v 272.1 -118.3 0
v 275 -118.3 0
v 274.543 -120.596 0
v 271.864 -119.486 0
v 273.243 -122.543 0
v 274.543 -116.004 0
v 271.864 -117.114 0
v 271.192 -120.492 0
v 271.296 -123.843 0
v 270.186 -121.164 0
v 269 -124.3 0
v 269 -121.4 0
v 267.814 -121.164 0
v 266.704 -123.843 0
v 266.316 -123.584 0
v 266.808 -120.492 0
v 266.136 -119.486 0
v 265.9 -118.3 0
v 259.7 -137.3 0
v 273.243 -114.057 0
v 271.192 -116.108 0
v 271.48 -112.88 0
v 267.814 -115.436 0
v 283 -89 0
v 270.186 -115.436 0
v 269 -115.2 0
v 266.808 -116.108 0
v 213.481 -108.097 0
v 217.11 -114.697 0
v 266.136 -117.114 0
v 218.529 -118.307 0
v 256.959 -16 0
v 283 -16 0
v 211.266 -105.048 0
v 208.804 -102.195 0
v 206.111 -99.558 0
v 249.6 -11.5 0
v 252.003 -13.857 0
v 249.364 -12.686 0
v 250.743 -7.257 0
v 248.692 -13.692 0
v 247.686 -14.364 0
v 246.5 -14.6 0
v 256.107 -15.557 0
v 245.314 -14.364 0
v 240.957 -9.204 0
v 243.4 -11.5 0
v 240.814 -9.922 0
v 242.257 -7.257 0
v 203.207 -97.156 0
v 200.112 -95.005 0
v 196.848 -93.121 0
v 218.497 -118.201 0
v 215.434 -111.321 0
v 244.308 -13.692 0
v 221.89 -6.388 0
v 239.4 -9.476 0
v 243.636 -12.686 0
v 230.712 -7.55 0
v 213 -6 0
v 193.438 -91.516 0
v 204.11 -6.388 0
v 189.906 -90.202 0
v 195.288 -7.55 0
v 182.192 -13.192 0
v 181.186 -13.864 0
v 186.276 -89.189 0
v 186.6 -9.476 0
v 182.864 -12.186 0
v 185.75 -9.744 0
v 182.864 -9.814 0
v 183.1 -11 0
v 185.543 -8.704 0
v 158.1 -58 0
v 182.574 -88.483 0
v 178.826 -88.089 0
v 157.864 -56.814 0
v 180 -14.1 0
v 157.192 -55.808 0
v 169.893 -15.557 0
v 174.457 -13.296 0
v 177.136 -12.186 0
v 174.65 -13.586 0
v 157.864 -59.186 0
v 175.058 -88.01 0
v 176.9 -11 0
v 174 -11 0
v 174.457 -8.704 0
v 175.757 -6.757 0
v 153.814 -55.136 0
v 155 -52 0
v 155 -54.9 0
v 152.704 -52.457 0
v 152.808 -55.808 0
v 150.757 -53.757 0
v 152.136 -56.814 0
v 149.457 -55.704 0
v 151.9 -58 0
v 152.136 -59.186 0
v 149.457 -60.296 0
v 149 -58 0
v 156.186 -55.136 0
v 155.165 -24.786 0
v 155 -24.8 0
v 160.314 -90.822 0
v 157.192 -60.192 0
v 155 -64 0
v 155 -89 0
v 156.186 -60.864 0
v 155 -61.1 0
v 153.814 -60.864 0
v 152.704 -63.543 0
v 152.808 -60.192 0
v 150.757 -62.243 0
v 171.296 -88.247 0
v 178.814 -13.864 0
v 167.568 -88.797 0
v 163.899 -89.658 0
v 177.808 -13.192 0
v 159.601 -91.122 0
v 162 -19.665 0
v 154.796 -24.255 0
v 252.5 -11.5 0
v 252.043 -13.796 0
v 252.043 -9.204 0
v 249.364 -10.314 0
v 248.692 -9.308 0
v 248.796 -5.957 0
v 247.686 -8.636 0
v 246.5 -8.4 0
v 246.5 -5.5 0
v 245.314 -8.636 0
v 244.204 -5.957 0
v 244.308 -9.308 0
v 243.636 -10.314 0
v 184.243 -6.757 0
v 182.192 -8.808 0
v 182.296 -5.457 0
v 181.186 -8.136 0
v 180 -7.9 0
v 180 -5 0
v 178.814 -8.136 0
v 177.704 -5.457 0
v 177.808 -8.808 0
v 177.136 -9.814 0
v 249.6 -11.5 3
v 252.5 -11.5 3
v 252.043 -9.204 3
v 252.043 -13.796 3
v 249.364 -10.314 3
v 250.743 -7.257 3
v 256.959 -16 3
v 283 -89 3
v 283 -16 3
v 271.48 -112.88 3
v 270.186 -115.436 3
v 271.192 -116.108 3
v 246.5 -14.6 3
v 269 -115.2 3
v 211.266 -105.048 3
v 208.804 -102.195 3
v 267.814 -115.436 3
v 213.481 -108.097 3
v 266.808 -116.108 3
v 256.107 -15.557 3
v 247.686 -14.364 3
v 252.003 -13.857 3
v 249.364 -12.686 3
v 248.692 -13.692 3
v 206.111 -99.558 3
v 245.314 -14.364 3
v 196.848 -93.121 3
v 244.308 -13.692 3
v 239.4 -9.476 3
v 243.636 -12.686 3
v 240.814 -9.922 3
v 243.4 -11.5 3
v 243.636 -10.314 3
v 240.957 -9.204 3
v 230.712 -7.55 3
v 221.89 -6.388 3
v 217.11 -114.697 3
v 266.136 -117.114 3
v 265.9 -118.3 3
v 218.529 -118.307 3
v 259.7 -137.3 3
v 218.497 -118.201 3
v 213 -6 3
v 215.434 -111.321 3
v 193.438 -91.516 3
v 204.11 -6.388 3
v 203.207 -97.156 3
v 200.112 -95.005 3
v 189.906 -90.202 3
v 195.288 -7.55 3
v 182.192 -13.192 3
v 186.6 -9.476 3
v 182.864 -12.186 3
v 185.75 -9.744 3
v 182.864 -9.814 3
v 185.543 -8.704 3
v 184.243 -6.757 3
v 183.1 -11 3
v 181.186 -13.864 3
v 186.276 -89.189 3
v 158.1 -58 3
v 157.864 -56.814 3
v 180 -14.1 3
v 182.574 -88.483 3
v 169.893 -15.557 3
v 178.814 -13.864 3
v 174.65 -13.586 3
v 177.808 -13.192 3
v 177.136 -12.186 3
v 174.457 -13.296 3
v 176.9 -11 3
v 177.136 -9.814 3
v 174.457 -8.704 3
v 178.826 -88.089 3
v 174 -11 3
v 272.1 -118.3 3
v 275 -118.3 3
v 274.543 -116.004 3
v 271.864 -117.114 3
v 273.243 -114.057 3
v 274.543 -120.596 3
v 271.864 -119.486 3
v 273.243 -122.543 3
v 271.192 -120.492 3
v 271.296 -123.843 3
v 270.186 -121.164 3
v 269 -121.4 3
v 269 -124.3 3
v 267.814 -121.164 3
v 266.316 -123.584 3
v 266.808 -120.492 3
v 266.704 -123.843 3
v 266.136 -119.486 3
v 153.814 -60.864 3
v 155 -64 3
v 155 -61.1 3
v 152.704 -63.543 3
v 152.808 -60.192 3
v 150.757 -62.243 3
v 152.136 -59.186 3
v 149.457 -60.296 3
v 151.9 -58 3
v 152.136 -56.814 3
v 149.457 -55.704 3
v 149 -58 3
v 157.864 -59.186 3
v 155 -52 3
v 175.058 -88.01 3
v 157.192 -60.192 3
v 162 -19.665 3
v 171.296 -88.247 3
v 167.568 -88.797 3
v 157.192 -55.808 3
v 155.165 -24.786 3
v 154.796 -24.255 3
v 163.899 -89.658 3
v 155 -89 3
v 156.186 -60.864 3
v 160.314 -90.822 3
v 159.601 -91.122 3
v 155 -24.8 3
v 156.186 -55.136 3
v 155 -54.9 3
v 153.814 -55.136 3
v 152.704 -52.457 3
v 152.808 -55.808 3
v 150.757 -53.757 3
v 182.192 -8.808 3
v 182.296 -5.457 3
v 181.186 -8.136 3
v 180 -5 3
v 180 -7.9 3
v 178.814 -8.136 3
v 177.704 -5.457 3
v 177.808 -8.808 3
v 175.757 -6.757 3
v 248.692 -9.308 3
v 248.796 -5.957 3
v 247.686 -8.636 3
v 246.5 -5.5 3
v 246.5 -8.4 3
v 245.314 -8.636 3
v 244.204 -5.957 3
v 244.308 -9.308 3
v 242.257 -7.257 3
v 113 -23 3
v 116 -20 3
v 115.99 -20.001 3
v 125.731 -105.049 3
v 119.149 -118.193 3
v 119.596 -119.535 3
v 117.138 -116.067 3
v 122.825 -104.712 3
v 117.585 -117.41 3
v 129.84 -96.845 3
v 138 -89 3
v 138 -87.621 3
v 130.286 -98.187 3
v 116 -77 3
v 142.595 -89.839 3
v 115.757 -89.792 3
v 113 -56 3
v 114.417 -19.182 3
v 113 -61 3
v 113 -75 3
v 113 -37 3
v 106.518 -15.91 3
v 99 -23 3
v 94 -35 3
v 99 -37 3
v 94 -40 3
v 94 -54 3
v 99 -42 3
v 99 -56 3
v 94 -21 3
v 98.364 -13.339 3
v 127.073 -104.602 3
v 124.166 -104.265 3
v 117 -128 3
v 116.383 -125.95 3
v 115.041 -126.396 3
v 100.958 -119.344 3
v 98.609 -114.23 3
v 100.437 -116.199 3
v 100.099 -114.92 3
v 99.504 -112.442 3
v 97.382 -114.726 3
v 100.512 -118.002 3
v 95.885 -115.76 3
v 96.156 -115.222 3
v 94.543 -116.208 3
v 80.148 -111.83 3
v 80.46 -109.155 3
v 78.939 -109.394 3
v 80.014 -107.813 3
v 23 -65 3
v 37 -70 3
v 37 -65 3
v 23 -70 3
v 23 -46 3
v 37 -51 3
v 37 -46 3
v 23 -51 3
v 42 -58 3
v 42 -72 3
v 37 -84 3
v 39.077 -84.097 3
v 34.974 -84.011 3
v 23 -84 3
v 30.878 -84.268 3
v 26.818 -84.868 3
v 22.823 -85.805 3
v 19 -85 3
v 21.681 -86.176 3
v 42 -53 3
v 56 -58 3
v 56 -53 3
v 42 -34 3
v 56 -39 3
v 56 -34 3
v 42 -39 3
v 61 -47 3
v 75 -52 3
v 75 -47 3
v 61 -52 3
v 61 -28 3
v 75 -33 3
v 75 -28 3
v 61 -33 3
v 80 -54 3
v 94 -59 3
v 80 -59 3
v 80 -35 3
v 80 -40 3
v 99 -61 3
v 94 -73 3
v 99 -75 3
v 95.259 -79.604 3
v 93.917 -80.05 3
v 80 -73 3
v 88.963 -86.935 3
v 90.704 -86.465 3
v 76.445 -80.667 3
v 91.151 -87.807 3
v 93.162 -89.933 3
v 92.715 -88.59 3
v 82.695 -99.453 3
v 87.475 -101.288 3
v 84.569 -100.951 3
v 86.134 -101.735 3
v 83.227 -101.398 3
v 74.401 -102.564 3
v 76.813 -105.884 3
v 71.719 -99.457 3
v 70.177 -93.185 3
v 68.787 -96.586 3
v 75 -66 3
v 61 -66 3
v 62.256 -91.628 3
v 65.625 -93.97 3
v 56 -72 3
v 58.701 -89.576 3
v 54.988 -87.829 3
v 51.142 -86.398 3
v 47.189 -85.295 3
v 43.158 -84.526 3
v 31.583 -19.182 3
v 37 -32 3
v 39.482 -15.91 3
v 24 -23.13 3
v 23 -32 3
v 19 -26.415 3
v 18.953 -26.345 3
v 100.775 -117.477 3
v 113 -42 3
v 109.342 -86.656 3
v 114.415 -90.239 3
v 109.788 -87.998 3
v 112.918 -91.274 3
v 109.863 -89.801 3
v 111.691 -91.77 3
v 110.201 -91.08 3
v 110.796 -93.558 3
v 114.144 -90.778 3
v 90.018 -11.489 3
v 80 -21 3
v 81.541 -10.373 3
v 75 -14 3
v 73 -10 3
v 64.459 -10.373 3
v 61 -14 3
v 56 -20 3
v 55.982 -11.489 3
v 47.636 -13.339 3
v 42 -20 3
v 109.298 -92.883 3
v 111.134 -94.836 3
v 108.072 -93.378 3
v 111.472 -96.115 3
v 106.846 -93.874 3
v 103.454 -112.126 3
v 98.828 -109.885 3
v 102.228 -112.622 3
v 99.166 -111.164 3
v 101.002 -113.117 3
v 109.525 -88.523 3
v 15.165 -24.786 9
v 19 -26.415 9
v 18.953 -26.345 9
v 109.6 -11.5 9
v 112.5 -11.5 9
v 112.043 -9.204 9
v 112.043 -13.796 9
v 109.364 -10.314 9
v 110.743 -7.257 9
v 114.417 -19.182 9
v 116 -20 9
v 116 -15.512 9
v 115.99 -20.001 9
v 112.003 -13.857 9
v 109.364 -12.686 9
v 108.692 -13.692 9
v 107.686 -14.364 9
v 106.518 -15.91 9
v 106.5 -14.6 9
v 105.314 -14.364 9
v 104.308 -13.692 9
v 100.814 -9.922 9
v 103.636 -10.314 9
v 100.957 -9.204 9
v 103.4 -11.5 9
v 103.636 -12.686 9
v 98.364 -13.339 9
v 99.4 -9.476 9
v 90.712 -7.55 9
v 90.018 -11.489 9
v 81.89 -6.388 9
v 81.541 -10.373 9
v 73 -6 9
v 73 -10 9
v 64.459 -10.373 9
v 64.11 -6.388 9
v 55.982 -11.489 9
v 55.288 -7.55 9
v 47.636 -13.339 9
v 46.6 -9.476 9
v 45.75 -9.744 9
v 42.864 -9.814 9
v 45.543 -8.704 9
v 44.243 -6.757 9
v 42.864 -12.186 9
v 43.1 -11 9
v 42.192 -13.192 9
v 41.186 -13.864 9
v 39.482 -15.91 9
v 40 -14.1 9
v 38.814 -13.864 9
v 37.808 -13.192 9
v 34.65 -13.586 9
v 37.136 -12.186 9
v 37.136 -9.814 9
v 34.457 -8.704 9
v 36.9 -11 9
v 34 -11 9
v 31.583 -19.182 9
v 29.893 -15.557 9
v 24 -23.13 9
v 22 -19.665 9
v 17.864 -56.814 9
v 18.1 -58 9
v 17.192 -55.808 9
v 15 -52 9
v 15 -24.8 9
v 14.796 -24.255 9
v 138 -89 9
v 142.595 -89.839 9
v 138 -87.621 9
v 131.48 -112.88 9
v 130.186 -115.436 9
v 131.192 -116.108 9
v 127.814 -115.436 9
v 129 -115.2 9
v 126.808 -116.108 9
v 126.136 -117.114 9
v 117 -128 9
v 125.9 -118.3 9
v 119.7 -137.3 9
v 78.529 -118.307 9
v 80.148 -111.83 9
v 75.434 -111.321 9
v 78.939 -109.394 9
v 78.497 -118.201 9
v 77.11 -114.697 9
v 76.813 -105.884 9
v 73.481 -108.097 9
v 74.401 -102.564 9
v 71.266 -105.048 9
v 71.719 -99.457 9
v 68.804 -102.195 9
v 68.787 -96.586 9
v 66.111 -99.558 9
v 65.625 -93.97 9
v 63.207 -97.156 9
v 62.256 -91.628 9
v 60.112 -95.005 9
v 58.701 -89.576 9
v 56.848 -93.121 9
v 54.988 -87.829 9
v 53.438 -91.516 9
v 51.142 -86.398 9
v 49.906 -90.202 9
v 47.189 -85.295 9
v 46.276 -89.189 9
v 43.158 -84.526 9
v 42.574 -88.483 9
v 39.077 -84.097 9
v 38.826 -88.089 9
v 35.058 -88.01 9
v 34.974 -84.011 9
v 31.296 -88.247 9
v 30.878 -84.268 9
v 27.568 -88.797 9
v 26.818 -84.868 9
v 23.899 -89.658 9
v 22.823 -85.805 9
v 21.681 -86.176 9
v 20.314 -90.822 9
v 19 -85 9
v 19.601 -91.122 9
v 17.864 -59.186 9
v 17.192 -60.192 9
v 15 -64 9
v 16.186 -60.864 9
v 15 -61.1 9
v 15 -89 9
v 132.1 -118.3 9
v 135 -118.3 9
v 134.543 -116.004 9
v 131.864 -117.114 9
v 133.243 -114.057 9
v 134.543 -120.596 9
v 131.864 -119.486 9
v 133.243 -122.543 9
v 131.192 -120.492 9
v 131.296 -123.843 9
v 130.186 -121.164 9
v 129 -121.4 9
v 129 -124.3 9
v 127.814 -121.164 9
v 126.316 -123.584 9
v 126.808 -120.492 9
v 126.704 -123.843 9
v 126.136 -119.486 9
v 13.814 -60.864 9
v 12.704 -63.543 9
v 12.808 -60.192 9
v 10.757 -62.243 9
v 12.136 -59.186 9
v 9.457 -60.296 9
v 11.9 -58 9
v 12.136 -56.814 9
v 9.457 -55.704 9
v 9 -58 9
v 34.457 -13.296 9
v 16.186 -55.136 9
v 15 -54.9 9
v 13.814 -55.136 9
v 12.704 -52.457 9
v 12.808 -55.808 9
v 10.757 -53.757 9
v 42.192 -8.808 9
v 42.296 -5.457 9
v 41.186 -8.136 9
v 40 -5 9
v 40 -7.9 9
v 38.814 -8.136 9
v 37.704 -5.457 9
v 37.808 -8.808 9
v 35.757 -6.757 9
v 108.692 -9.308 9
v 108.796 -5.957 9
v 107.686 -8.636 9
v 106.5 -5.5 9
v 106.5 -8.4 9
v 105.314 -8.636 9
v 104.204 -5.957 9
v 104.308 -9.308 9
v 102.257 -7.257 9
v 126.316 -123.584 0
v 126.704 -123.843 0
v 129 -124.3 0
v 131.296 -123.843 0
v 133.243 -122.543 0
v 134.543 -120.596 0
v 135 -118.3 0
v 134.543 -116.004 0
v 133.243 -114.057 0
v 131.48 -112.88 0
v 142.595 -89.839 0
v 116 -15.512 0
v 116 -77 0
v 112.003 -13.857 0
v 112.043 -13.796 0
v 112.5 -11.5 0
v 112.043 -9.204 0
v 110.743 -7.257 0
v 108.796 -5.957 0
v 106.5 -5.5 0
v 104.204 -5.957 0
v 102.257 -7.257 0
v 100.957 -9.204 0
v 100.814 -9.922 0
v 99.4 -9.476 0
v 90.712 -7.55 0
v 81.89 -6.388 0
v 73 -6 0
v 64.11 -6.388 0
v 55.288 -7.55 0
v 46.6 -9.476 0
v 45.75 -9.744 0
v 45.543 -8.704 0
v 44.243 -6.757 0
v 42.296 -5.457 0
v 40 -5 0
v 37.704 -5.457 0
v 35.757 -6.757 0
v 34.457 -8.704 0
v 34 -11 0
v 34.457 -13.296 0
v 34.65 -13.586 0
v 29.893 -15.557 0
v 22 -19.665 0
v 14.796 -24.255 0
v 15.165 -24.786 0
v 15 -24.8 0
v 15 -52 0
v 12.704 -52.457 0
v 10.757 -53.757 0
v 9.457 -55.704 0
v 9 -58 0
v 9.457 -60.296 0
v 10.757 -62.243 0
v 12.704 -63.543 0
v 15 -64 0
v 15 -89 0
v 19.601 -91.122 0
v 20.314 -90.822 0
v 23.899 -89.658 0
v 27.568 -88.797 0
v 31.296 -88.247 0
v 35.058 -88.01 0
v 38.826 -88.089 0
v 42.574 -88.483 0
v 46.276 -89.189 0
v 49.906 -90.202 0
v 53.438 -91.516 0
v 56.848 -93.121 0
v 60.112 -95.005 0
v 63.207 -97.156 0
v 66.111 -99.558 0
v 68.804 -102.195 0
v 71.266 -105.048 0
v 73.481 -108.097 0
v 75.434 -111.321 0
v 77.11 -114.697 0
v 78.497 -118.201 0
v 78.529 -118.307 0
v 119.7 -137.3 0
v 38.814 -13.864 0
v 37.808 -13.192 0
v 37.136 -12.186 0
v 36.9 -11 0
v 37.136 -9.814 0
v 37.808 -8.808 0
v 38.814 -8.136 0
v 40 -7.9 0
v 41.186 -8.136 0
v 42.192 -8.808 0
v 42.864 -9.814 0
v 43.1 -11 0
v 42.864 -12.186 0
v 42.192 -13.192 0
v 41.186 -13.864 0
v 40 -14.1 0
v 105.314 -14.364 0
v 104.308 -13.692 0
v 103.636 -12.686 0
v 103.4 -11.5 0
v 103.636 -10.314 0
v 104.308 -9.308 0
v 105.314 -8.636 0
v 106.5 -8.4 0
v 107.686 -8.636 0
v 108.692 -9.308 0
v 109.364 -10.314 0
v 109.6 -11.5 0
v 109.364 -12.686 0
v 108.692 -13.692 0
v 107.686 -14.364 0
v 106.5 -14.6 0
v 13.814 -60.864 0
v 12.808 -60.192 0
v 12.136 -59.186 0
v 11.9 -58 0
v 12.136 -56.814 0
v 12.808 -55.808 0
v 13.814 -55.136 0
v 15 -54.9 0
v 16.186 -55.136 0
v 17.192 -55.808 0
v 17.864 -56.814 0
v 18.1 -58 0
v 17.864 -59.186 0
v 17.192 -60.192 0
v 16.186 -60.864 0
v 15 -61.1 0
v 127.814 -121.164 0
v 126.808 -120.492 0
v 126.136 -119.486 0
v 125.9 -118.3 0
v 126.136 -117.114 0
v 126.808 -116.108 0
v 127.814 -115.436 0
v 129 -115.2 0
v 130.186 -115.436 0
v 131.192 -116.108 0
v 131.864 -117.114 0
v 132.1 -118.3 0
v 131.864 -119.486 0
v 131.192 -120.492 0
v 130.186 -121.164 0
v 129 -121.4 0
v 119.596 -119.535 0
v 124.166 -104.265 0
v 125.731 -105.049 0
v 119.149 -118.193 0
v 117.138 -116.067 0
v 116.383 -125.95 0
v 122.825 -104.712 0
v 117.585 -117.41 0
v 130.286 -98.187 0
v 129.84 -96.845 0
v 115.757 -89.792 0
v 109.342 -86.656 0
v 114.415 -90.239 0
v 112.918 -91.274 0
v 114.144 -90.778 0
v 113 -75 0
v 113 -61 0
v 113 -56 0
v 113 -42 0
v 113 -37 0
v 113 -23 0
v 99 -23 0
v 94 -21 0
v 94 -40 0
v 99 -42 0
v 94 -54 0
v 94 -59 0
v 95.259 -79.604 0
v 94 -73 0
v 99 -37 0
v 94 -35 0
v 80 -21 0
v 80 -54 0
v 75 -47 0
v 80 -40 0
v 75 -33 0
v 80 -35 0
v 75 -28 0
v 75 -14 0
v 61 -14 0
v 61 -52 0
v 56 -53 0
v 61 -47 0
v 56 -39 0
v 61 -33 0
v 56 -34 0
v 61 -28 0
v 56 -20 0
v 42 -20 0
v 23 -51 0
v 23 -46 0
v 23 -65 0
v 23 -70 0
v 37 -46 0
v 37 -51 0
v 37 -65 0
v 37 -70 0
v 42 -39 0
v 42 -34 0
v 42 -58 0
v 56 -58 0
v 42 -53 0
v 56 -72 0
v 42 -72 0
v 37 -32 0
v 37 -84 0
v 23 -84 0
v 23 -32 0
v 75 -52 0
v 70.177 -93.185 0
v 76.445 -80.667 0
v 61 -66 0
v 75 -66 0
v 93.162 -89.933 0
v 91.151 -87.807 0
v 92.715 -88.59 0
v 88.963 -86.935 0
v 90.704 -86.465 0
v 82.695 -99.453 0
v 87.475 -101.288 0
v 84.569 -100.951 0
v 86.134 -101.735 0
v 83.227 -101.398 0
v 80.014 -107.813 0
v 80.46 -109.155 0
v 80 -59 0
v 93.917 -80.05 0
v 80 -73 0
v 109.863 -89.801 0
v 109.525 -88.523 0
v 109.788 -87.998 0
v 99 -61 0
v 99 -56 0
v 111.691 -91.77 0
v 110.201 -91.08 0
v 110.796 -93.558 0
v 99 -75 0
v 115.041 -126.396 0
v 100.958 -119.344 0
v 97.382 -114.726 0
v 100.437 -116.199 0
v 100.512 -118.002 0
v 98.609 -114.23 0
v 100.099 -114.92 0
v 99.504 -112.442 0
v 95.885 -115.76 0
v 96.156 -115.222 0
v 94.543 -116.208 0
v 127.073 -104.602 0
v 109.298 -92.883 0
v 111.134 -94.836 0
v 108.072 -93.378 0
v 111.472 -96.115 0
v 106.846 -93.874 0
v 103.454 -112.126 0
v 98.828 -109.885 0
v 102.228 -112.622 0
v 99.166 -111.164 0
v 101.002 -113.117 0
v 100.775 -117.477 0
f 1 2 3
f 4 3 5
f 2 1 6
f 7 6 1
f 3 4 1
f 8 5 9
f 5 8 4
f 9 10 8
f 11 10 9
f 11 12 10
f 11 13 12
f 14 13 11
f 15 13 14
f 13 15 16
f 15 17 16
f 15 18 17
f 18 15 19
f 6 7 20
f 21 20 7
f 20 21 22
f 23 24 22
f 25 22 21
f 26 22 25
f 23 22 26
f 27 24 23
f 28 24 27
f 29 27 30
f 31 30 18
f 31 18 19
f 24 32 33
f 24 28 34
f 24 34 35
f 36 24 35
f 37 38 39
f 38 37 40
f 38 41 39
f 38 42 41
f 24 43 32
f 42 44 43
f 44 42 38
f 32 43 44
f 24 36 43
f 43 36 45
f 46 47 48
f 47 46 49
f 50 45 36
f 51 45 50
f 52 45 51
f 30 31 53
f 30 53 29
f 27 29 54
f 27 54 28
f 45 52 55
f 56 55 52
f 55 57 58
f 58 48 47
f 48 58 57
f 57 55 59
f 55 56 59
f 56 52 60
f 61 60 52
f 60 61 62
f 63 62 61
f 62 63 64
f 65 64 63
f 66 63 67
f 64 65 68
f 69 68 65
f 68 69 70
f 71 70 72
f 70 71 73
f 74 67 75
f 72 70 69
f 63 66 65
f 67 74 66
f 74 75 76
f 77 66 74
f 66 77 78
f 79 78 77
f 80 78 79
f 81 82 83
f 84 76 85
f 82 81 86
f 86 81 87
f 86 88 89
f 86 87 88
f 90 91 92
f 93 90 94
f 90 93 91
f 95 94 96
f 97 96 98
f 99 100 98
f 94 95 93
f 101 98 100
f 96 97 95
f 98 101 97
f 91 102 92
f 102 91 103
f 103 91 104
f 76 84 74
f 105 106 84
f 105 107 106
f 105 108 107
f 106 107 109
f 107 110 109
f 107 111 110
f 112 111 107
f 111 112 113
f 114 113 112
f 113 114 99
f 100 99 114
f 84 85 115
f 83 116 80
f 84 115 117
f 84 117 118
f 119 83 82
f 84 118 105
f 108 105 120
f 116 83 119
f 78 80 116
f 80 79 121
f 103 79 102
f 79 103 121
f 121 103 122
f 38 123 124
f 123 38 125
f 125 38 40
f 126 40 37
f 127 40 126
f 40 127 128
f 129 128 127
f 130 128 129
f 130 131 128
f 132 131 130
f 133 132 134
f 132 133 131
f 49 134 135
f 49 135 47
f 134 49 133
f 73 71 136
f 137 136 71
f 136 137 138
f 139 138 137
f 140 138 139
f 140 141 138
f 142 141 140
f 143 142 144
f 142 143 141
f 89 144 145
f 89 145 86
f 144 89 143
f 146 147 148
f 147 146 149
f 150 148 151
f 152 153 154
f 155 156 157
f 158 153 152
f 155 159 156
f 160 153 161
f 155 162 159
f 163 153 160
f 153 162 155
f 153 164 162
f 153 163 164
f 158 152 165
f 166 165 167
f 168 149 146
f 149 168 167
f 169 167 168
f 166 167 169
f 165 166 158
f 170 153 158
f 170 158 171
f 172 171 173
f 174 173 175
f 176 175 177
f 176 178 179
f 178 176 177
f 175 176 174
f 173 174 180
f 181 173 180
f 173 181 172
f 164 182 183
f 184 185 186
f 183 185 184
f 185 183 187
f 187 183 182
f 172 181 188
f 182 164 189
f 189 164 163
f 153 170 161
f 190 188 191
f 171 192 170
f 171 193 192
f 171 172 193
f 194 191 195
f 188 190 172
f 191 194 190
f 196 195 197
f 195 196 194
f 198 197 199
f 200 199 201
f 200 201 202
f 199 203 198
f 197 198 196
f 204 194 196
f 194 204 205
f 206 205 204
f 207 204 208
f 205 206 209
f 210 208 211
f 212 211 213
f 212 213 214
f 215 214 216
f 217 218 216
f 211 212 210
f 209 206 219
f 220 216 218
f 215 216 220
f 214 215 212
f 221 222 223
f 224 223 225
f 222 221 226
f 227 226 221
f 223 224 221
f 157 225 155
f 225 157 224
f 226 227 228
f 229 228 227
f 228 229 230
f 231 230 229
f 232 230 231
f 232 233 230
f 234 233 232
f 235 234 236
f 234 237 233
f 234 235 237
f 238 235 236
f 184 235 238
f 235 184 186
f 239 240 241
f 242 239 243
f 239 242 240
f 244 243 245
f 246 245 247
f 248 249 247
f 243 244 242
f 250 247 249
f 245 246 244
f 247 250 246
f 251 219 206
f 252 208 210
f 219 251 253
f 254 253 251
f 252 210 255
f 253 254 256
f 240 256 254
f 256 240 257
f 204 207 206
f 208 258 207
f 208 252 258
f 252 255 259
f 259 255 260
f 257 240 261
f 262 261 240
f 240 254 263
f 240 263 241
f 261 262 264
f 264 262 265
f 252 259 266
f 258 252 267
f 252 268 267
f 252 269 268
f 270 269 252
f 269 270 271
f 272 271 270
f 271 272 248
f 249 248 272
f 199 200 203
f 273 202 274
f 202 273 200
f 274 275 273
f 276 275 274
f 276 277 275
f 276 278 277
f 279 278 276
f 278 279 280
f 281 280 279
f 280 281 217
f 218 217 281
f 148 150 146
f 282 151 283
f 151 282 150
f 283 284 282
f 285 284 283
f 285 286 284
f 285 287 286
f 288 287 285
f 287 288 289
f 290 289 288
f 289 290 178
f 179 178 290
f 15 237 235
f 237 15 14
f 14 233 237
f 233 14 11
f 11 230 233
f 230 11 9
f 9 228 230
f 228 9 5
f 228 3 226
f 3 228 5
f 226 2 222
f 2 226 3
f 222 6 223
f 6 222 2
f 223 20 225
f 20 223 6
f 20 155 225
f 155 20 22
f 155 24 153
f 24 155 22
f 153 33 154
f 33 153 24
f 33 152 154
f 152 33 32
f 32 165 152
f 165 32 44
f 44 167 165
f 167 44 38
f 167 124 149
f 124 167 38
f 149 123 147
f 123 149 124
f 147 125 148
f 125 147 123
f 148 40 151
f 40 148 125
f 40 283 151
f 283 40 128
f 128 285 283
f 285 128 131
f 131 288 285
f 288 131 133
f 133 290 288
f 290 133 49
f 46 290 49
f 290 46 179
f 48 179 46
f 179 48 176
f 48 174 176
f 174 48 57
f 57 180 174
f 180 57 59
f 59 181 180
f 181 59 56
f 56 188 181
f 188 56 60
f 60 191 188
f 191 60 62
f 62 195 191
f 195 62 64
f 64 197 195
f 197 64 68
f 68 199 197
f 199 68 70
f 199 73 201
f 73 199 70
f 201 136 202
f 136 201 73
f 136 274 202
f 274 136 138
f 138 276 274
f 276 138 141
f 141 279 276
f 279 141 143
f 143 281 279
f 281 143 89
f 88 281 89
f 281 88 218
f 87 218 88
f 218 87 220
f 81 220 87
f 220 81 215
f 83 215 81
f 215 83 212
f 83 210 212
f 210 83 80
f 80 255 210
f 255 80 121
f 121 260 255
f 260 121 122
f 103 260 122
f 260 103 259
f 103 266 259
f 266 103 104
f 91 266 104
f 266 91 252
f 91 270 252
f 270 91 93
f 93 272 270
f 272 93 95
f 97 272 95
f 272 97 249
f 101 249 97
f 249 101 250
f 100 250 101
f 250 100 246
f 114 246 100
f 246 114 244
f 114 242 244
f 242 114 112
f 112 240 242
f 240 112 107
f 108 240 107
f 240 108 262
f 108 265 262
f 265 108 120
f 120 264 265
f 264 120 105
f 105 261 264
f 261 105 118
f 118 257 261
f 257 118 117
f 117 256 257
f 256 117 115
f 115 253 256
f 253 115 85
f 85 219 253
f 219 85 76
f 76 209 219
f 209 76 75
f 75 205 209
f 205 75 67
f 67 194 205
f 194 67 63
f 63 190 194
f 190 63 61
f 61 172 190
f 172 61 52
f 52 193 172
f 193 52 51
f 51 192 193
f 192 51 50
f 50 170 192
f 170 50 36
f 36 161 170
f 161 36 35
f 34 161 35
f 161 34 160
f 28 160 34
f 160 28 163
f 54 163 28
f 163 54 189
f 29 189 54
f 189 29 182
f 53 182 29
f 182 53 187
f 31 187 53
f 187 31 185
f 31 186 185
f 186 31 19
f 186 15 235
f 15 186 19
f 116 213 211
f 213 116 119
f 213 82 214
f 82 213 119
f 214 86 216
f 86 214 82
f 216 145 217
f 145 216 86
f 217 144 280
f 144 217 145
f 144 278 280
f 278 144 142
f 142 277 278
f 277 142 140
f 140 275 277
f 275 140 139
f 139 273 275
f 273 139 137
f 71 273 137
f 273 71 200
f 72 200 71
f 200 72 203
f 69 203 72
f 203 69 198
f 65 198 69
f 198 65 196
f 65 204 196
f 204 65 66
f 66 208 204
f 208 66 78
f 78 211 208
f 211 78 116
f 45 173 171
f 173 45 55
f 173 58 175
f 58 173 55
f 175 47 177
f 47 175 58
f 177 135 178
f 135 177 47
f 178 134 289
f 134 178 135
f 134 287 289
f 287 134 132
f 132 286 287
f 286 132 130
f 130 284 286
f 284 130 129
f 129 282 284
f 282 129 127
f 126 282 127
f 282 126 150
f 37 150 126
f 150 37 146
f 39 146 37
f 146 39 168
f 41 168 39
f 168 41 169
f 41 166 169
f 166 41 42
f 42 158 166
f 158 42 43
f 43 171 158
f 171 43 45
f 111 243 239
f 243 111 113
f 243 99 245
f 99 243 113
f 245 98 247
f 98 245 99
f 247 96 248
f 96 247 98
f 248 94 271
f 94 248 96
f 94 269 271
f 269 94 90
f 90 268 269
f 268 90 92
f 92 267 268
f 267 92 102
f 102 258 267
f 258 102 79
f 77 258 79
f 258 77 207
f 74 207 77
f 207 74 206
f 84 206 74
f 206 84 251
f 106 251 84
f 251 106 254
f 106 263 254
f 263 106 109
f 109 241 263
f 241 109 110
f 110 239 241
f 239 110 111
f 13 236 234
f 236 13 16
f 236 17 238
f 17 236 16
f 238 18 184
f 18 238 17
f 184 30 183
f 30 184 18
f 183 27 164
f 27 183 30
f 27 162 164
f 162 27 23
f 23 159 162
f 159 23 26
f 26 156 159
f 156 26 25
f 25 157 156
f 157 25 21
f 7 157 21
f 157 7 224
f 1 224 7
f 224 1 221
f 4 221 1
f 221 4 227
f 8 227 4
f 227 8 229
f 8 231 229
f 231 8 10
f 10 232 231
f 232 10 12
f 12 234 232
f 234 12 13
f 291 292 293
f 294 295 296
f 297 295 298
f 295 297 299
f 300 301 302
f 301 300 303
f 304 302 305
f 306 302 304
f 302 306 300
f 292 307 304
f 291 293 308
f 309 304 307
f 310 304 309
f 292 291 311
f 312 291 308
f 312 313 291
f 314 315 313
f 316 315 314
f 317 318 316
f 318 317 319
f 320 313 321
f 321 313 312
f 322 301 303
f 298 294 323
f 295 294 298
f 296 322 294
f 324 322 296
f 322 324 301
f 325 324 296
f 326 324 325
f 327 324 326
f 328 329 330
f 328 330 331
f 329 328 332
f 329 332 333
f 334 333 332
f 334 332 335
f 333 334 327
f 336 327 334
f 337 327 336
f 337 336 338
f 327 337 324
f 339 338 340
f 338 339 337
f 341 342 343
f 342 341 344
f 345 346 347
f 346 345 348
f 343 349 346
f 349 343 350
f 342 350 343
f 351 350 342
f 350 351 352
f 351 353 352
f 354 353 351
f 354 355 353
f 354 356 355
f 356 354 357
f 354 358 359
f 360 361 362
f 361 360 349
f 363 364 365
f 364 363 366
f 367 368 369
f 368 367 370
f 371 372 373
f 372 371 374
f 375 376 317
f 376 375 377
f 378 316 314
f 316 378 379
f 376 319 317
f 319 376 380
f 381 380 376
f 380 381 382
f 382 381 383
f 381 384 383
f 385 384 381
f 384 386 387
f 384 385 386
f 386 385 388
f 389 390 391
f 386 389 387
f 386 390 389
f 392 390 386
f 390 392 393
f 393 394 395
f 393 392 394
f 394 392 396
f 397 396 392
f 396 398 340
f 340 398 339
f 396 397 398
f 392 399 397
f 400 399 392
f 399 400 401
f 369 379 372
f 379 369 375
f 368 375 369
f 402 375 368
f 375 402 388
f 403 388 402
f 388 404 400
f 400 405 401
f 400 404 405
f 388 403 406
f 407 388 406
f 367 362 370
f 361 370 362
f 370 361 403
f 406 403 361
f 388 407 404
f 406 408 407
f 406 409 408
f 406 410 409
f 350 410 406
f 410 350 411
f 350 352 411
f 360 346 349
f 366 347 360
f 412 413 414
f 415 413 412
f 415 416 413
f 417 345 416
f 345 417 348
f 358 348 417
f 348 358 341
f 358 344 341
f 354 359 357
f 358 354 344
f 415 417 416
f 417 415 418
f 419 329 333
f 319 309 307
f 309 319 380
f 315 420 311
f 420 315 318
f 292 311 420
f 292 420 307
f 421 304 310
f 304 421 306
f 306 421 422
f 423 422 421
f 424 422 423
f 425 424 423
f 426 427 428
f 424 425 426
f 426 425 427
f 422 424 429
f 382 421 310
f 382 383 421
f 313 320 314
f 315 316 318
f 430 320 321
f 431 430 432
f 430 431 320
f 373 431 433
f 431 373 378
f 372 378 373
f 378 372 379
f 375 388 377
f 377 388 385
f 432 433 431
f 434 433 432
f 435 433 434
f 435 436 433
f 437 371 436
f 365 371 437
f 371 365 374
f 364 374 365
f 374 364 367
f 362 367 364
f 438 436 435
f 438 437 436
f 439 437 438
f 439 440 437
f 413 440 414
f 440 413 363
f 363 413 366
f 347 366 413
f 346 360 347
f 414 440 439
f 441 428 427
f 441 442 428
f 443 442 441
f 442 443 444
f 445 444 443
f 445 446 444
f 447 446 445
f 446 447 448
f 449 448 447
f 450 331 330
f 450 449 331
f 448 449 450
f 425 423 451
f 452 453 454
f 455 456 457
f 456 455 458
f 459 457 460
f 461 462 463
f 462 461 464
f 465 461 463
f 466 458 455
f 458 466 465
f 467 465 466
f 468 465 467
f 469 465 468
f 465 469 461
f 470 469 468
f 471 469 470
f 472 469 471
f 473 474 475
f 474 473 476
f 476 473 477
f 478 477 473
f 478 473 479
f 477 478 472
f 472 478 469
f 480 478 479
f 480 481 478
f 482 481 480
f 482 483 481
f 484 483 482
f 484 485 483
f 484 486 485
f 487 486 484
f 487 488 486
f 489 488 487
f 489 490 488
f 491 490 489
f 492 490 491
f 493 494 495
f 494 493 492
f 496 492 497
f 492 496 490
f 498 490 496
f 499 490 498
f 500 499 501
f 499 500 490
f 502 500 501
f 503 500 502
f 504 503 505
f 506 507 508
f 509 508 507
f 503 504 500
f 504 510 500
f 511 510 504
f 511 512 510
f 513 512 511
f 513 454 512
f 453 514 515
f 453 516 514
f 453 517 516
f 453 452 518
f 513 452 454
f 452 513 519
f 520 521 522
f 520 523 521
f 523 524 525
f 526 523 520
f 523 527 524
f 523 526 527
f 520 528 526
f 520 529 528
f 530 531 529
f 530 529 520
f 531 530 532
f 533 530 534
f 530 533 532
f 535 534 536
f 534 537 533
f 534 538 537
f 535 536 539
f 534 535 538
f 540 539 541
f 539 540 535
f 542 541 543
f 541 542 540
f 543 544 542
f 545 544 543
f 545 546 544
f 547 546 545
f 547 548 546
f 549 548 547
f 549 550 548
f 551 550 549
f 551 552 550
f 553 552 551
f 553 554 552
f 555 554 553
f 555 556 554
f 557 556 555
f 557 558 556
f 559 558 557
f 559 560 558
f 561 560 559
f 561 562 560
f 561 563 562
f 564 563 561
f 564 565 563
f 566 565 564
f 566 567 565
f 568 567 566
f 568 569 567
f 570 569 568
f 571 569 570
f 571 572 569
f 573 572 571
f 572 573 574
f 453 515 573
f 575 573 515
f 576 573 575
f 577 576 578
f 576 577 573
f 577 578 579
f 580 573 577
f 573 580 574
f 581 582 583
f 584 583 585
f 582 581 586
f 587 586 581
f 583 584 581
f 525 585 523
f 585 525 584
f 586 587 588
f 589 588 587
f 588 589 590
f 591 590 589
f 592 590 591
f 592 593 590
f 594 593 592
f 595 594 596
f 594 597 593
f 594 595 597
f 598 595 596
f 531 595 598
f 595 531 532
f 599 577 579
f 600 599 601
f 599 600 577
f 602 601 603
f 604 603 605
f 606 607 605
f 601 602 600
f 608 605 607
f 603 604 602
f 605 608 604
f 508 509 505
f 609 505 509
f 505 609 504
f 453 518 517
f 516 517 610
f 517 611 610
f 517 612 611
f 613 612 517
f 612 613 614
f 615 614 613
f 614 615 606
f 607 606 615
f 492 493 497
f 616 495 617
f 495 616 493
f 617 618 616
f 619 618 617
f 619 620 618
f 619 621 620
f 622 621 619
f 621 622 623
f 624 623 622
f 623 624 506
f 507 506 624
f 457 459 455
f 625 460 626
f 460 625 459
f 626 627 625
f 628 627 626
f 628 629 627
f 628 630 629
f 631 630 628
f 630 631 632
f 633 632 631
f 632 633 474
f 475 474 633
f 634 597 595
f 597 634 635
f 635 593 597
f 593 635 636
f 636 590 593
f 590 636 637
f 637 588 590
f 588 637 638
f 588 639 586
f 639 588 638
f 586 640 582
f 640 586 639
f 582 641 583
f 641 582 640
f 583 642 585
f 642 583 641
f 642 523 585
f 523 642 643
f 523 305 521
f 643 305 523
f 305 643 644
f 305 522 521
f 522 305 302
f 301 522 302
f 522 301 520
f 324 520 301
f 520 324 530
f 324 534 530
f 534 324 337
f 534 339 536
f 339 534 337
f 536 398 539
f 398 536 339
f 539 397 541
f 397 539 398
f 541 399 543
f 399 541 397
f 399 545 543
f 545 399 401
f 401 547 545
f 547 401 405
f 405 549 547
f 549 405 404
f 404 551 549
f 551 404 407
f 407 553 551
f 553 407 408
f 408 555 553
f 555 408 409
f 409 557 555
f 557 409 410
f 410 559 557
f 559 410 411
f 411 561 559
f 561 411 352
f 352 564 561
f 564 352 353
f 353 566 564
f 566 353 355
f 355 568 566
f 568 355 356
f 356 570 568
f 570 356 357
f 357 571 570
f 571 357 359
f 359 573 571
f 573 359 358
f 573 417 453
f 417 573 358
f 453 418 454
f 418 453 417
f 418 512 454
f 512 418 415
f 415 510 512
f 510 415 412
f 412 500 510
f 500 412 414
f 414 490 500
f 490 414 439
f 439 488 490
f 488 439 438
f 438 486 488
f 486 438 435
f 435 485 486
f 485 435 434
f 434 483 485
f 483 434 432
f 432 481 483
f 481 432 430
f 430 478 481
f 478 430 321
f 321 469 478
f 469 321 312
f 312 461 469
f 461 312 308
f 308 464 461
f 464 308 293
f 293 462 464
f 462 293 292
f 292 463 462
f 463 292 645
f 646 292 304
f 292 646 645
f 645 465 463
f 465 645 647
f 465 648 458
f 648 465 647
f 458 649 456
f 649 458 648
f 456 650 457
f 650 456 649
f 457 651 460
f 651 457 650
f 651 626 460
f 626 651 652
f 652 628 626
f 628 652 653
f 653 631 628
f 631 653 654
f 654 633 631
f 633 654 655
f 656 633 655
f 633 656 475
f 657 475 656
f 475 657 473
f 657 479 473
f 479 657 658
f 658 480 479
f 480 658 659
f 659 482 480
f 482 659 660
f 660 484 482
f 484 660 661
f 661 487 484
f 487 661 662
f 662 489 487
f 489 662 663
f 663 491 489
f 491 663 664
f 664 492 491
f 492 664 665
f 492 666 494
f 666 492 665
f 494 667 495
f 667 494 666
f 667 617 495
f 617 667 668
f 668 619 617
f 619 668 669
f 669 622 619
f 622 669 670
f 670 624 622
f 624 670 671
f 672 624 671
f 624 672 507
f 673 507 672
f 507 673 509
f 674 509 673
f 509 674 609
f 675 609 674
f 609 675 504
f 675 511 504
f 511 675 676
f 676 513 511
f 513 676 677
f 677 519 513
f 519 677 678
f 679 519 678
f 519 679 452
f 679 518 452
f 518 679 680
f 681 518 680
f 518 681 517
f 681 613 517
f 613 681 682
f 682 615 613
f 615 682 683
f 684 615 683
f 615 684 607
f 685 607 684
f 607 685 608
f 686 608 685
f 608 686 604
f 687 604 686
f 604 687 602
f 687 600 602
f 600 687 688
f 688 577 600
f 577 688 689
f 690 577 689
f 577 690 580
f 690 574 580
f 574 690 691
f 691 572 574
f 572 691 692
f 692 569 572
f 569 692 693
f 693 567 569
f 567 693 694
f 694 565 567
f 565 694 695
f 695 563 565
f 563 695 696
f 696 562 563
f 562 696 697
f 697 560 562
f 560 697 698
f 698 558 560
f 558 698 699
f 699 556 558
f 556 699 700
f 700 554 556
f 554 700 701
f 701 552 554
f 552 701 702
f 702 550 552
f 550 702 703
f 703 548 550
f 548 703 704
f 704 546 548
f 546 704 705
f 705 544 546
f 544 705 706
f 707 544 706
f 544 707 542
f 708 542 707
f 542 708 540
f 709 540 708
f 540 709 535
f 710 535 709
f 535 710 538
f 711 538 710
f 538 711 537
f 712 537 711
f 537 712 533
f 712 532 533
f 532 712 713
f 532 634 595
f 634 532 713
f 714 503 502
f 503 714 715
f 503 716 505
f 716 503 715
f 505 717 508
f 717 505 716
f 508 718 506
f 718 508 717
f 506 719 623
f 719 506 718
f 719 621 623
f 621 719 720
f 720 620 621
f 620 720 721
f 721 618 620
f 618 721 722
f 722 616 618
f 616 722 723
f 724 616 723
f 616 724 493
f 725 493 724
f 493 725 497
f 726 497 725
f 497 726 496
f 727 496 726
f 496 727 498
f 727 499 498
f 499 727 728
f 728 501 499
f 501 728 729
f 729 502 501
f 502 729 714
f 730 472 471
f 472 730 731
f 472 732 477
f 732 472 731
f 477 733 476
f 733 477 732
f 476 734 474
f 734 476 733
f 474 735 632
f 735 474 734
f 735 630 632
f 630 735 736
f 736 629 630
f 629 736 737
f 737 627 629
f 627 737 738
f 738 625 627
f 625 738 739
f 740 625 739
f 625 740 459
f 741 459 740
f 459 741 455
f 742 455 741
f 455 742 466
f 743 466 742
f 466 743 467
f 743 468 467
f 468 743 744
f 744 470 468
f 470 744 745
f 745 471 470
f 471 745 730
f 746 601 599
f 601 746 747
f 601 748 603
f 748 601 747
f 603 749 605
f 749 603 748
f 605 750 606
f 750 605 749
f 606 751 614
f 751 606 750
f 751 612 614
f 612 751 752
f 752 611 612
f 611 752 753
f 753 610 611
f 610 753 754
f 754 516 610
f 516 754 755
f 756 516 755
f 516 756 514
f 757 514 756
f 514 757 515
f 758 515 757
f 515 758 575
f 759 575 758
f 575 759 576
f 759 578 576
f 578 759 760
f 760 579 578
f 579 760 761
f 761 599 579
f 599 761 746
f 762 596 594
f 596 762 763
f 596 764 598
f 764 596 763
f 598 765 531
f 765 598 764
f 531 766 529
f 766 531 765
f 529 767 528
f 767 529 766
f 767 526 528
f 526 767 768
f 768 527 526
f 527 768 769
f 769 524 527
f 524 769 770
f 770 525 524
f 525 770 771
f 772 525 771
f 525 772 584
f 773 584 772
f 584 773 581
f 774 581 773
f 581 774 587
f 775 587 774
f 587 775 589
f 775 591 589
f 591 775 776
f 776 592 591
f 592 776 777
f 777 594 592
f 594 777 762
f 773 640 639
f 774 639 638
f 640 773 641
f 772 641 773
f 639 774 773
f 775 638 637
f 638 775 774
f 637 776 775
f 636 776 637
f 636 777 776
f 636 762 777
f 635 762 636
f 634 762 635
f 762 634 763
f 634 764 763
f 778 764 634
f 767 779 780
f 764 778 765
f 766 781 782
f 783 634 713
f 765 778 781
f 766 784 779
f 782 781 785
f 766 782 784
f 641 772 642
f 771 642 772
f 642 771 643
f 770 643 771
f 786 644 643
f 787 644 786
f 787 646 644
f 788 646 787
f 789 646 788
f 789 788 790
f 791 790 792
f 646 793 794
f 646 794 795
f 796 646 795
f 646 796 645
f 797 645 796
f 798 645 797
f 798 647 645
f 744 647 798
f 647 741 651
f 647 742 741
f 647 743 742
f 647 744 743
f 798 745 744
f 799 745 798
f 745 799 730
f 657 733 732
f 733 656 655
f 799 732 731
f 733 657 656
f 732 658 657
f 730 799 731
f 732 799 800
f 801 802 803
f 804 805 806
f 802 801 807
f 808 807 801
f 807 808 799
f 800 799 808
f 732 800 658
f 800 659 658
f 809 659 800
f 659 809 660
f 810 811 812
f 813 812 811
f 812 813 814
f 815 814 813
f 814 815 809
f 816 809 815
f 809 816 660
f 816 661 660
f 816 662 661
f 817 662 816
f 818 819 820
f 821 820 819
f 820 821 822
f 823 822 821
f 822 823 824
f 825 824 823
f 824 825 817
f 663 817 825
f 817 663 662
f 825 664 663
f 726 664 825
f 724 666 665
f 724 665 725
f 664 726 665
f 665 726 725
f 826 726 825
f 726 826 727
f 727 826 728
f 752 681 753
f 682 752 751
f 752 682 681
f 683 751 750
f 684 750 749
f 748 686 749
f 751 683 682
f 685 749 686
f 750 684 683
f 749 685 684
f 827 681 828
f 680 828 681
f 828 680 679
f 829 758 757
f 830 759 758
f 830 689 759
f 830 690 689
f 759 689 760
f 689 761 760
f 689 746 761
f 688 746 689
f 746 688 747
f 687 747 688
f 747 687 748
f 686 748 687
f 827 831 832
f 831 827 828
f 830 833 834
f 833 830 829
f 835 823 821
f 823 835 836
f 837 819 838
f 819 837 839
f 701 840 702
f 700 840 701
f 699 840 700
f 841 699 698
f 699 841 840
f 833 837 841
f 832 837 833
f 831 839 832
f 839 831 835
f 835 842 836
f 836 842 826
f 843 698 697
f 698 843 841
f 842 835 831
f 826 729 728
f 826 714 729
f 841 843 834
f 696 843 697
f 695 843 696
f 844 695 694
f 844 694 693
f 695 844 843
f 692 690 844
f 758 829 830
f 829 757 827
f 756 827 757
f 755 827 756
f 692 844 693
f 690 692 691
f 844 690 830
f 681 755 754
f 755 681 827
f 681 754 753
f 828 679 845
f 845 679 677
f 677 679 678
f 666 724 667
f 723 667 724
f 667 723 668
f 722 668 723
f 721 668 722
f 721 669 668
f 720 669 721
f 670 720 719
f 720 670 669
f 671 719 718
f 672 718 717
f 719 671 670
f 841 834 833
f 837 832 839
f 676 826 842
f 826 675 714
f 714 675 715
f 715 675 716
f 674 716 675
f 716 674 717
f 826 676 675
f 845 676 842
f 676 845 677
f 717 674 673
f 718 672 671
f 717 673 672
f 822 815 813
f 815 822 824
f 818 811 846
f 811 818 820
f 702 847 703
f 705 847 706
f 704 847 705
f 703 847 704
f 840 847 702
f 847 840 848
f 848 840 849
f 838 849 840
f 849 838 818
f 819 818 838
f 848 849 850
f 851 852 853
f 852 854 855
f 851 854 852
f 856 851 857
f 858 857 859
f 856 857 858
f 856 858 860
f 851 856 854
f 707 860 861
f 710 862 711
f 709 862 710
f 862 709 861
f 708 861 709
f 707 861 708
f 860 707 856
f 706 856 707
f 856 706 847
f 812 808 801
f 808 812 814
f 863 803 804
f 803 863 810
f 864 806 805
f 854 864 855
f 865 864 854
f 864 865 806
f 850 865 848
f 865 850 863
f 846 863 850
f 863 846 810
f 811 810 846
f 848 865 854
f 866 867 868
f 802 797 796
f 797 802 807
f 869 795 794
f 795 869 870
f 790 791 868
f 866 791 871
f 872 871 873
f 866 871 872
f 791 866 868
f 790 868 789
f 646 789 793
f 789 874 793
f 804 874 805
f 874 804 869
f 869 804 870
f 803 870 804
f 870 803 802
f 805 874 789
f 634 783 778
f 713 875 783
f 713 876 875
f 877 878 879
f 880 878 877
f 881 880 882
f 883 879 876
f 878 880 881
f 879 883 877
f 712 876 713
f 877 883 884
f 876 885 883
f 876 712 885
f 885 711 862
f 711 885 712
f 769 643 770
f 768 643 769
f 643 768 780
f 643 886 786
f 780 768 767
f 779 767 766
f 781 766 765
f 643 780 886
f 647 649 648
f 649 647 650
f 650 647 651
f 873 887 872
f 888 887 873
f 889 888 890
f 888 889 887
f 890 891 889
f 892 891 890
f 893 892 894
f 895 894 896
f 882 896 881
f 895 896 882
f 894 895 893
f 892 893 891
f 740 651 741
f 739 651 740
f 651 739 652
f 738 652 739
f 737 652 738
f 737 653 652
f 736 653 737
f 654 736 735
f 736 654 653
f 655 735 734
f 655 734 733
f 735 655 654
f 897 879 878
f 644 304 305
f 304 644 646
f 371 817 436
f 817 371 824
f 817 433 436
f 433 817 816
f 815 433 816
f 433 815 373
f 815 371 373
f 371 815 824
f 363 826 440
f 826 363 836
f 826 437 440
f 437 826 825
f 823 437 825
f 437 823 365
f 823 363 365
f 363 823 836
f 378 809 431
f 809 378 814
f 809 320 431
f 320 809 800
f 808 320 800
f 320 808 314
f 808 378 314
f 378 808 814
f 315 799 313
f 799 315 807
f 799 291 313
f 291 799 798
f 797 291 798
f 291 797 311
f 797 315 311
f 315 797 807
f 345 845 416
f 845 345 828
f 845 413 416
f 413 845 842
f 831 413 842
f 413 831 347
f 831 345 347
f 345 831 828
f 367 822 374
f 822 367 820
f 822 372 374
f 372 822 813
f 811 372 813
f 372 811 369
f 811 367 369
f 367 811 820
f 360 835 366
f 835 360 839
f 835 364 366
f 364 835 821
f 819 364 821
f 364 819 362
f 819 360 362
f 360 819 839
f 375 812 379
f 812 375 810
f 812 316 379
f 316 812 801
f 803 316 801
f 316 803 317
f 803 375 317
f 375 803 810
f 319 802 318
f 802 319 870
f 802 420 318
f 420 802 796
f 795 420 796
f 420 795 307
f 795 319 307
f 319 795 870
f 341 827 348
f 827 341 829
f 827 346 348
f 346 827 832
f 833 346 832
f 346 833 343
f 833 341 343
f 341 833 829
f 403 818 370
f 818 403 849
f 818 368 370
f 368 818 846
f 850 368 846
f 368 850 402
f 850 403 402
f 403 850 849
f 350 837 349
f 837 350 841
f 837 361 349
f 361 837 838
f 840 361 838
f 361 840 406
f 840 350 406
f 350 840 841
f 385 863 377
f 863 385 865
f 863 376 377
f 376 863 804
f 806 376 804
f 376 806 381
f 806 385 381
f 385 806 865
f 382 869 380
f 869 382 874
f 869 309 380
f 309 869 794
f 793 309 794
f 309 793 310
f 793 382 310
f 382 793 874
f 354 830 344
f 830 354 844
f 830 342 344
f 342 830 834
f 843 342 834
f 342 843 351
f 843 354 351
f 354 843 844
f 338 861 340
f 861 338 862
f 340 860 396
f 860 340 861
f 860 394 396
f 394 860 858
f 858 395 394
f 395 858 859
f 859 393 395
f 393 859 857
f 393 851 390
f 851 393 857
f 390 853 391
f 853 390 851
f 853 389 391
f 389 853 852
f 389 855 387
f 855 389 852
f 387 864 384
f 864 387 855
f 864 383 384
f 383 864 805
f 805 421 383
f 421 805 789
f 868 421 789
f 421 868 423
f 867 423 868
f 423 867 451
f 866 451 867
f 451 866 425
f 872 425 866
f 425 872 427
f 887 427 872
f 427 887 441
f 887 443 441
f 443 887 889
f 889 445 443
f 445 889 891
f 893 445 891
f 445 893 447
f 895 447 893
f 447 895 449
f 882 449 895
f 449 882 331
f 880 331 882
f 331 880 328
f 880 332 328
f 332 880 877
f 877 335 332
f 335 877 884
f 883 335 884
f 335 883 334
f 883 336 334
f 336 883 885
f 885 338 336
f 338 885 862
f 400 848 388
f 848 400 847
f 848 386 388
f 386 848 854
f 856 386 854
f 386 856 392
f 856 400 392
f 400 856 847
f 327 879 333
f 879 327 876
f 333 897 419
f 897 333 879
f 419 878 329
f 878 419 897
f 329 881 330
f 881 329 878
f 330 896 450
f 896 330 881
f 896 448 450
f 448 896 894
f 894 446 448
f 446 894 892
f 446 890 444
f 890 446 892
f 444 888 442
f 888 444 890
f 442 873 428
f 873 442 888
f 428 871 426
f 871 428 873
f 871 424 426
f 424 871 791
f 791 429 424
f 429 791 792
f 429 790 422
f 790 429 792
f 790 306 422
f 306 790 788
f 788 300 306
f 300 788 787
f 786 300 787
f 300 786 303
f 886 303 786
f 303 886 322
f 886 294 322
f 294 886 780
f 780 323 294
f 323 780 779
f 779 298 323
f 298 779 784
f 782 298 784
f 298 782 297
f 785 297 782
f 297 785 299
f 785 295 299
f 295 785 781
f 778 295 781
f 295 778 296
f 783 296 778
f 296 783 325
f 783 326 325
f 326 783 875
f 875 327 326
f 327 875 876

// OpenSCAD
$fn = 16;

bottom_thickness = 3;
middle_thickness = 5;
switch_thickness = 5;

is_36 = true;

module sector(radius, angles, fn = 24) {
    r = radius / cos(180 / fn);
    step = -360 / fn;

    points = concat([[0, 0]],
        [for(a = [angles[0] : step : angles[1] - 360]) 
            [r * cos(a), r * sin(a)]
        ],
        [[r * cos(angles[1]), r * sin(angles[1])]]
    );

    difference() {
        circle(radius, $fn = fn);
        polygon(points);
    }
}

module arc(radius, angles, width = 1, fn = 24) {
    difference() {
        sector(radius + width, angles, fn);
        sector(radius, angles, fn);
    }
}

module single_screw_hole() {
    circle(r=1.2);
}

module screw_holes() {
    union() {
        translate([17.5,  -26,    0]) single_screw_hole();
        translate([18.5,  -88,    0]) single_screw_hole();
        translate([81.0,  -116,   0]) single_screw_hole();
        translate([118.5, -132.5, 0]) single_screw_hole();
        translate([139,   -88.5,  0]) single_screw_hole();
        translate([140,   -56.5,  0]) single_screw_hole();
        translate([140,   -20.5,  0]) single_screw_hole();
        translate([112.5, -17.2,  0]) single_screw_hole();
        translate([71,    -8.6,   0]) single_screw_hole();
    }
}

tenting_positions = [[129, -118.3], [40, -11], [106.5, -11.5], [15, -58]];
module tenting_wing() {
    circle(r=6);
}

module tenting_hole() {
    circle(r=3.1);
}

module alpha_holes() {
    for (j=[0:2]) {
        translate([0, (j * 19), 0]) {
            for (i=[0:4]) {
                translate([(i * 19), 0, 0]) {
                    square(size=[14, 14], center=true);
                }
            }
        }
    }
}

module lone_hole() {
    translate([79.57, -90.06]) {
        rotate([0, 0, 63.4]) {
            square(size=[14, 14], center=true);
        }
    }
}

module thumb_hole() {
    polygon(
        points=[
            [7,       7],
            [7,       5],
            [8.5,     5],
            [8.5,     8],
            [15.5,    8],
            [15.5,    2.3],
            [16.25,   2.3],
            [16.25,  -1],
            [15.5,   -1],
            [15.5,   -7],
            [14.5,   -7],
            [14.5,   -8],
            [9,      -8],
            [9,      -7],
            [8.5,    -7],
            [8.5,    -6],
            [7,      -6],
            [7,      -7],
            [-7,     -7],
            [-7,     -6],
            [-8.5,   -6],
            [-8.5,   -7],
            [-9,     -7],
            [-9,     -8],
            [-14.5,  -8],
            [-14.5,  -7],
            [-15.5,  -7],
            [-15.5,  -1],
            [-16.25, -1],
            [-16.25,  2.3],
            [-15.5,   2.3],
            [-15.5,   8],
            [-8.5,    8],
            [-8.5,    5],
            [-7,      5],
            [-7,      7],
        ]
    );
    
}

module plain_thumb_hole() {
    polygon(
        points=[
            [-17,   11],
            [-7,    11],
            [-7,     7],
            [7,      7],
            [7,     11],
            [17,    11],
            [17,   -8.7],
            [8.5,  -8.7],
            [8.5,  -7],
            [-8.5, -7],
            [-8.5, -8.7],
            [-17,  -8.7],
        ]
    );
    
}

stagger = [-39, -27, -21, -28, -30];

module alpha_holes() {
    for (i=[0:2]) {
        for (j=[0:4]) {
            translate([(30 + j * 19), (stagger[j] - i * 19)])
            square(size=[14, 14], center=true);
        }
    }
}

module inner_room() {
    angles = [63.7, 123.5];
    anglea = [15, 112];
    difference() {
        union() {
            translate([73, -108]) sector(98, angles, 72);
            polygon(
                points=[
                    [19,   -26.4],
                    [19,   -85],
                    [117,  -128],
                    [138,  -89],
                    [138,  -20],
                    [116,  -20],
                ]
            );
        }
        translate([36, -133]) sector(49, anglea, 75);
    }
}

module bottom_plate() {
    angles = [63.7, 124.8];
    anglea = [15, 112];
    difference() {
        union() {
            translate([73, -108]) sector(102, angles, 72);
            polygon(
                points=[
                    [15,    -24.8],
                    [15,    -89],
                    [119.7, -137.3],
                    [143,   -89],
                    [143,   -16],
                    [116,   -16],
                ]
            );
            for (i=[0:3]) {
                translate(tenting_positions[i]) tenting_wing();
            }
        }
        translate([36, -133]) sector(45, anglea, 75);
        //screw_holes();
        for (i=[0:3]) {
            translate(tenting_positions[i]) tenting_hole();
        }
    }
}

module thumb_imported_from_file() {
    translate([7, -6.3, 0]) {
        rotate([0, 0, -30]) {
            import("2u-cutout.dxf");
        }
    }
}

module switch_plate() {
    difference() {
        bottom_plate();
        alpha_holes();
        translate([96.6, -98.7, 0]) {
            rotate([0, 0, 153.4]) {
                thumb_imported_from_file();
            }
        }
        translate([113.7, -107.3, 0]) {
            rotate([0, 0, -26.6]) {
                thumb_imported_from_file();
            }
        }
        if (is_36) {
            lone_hole();
        }
        polygon(
            points= [
                [145,   -15],
                [116,   -15],
                [116,   -77],
                [145,   -91],
            ]
        );
    }
}

module middle_plate() {
    difference() {
        bottom_plate();
        inner_room();
        polygon(
            points= [
                [145,   -15],
                [116,   -15],
                [116,   -77],
                [145,   -91],
            ]
        );
        polygon(
            points= [
                [122.5,   -61],
                [122.5,   -73.5],
                [149,     -73.5],
                [149,     -61],
            ]
        );
    }
}

//translate([140, 0, 3]) color([0.2, 0.2, 0.2]) bottom_plate();
//translate([0, 140, 3]) color([0.2, 0.2, 0.2]) middle_plate();
//translate([0, 0, 6]) color([0.2, 0.2, 0.9]) switch_plate();

translate([140, 0, 0]) color([0.4, 0.3, 0.2]) linear_extrude(height = 3) bottom_plate();
translate([0, 0, 3])   color([0.2, 0.3, 0.2]) linear_extrude(height = 6) middle_plate();
translate([0, 0, 0])   color([0.2, 0.3, 0.9]) linear_extrude(height = 3) switch_plate();
